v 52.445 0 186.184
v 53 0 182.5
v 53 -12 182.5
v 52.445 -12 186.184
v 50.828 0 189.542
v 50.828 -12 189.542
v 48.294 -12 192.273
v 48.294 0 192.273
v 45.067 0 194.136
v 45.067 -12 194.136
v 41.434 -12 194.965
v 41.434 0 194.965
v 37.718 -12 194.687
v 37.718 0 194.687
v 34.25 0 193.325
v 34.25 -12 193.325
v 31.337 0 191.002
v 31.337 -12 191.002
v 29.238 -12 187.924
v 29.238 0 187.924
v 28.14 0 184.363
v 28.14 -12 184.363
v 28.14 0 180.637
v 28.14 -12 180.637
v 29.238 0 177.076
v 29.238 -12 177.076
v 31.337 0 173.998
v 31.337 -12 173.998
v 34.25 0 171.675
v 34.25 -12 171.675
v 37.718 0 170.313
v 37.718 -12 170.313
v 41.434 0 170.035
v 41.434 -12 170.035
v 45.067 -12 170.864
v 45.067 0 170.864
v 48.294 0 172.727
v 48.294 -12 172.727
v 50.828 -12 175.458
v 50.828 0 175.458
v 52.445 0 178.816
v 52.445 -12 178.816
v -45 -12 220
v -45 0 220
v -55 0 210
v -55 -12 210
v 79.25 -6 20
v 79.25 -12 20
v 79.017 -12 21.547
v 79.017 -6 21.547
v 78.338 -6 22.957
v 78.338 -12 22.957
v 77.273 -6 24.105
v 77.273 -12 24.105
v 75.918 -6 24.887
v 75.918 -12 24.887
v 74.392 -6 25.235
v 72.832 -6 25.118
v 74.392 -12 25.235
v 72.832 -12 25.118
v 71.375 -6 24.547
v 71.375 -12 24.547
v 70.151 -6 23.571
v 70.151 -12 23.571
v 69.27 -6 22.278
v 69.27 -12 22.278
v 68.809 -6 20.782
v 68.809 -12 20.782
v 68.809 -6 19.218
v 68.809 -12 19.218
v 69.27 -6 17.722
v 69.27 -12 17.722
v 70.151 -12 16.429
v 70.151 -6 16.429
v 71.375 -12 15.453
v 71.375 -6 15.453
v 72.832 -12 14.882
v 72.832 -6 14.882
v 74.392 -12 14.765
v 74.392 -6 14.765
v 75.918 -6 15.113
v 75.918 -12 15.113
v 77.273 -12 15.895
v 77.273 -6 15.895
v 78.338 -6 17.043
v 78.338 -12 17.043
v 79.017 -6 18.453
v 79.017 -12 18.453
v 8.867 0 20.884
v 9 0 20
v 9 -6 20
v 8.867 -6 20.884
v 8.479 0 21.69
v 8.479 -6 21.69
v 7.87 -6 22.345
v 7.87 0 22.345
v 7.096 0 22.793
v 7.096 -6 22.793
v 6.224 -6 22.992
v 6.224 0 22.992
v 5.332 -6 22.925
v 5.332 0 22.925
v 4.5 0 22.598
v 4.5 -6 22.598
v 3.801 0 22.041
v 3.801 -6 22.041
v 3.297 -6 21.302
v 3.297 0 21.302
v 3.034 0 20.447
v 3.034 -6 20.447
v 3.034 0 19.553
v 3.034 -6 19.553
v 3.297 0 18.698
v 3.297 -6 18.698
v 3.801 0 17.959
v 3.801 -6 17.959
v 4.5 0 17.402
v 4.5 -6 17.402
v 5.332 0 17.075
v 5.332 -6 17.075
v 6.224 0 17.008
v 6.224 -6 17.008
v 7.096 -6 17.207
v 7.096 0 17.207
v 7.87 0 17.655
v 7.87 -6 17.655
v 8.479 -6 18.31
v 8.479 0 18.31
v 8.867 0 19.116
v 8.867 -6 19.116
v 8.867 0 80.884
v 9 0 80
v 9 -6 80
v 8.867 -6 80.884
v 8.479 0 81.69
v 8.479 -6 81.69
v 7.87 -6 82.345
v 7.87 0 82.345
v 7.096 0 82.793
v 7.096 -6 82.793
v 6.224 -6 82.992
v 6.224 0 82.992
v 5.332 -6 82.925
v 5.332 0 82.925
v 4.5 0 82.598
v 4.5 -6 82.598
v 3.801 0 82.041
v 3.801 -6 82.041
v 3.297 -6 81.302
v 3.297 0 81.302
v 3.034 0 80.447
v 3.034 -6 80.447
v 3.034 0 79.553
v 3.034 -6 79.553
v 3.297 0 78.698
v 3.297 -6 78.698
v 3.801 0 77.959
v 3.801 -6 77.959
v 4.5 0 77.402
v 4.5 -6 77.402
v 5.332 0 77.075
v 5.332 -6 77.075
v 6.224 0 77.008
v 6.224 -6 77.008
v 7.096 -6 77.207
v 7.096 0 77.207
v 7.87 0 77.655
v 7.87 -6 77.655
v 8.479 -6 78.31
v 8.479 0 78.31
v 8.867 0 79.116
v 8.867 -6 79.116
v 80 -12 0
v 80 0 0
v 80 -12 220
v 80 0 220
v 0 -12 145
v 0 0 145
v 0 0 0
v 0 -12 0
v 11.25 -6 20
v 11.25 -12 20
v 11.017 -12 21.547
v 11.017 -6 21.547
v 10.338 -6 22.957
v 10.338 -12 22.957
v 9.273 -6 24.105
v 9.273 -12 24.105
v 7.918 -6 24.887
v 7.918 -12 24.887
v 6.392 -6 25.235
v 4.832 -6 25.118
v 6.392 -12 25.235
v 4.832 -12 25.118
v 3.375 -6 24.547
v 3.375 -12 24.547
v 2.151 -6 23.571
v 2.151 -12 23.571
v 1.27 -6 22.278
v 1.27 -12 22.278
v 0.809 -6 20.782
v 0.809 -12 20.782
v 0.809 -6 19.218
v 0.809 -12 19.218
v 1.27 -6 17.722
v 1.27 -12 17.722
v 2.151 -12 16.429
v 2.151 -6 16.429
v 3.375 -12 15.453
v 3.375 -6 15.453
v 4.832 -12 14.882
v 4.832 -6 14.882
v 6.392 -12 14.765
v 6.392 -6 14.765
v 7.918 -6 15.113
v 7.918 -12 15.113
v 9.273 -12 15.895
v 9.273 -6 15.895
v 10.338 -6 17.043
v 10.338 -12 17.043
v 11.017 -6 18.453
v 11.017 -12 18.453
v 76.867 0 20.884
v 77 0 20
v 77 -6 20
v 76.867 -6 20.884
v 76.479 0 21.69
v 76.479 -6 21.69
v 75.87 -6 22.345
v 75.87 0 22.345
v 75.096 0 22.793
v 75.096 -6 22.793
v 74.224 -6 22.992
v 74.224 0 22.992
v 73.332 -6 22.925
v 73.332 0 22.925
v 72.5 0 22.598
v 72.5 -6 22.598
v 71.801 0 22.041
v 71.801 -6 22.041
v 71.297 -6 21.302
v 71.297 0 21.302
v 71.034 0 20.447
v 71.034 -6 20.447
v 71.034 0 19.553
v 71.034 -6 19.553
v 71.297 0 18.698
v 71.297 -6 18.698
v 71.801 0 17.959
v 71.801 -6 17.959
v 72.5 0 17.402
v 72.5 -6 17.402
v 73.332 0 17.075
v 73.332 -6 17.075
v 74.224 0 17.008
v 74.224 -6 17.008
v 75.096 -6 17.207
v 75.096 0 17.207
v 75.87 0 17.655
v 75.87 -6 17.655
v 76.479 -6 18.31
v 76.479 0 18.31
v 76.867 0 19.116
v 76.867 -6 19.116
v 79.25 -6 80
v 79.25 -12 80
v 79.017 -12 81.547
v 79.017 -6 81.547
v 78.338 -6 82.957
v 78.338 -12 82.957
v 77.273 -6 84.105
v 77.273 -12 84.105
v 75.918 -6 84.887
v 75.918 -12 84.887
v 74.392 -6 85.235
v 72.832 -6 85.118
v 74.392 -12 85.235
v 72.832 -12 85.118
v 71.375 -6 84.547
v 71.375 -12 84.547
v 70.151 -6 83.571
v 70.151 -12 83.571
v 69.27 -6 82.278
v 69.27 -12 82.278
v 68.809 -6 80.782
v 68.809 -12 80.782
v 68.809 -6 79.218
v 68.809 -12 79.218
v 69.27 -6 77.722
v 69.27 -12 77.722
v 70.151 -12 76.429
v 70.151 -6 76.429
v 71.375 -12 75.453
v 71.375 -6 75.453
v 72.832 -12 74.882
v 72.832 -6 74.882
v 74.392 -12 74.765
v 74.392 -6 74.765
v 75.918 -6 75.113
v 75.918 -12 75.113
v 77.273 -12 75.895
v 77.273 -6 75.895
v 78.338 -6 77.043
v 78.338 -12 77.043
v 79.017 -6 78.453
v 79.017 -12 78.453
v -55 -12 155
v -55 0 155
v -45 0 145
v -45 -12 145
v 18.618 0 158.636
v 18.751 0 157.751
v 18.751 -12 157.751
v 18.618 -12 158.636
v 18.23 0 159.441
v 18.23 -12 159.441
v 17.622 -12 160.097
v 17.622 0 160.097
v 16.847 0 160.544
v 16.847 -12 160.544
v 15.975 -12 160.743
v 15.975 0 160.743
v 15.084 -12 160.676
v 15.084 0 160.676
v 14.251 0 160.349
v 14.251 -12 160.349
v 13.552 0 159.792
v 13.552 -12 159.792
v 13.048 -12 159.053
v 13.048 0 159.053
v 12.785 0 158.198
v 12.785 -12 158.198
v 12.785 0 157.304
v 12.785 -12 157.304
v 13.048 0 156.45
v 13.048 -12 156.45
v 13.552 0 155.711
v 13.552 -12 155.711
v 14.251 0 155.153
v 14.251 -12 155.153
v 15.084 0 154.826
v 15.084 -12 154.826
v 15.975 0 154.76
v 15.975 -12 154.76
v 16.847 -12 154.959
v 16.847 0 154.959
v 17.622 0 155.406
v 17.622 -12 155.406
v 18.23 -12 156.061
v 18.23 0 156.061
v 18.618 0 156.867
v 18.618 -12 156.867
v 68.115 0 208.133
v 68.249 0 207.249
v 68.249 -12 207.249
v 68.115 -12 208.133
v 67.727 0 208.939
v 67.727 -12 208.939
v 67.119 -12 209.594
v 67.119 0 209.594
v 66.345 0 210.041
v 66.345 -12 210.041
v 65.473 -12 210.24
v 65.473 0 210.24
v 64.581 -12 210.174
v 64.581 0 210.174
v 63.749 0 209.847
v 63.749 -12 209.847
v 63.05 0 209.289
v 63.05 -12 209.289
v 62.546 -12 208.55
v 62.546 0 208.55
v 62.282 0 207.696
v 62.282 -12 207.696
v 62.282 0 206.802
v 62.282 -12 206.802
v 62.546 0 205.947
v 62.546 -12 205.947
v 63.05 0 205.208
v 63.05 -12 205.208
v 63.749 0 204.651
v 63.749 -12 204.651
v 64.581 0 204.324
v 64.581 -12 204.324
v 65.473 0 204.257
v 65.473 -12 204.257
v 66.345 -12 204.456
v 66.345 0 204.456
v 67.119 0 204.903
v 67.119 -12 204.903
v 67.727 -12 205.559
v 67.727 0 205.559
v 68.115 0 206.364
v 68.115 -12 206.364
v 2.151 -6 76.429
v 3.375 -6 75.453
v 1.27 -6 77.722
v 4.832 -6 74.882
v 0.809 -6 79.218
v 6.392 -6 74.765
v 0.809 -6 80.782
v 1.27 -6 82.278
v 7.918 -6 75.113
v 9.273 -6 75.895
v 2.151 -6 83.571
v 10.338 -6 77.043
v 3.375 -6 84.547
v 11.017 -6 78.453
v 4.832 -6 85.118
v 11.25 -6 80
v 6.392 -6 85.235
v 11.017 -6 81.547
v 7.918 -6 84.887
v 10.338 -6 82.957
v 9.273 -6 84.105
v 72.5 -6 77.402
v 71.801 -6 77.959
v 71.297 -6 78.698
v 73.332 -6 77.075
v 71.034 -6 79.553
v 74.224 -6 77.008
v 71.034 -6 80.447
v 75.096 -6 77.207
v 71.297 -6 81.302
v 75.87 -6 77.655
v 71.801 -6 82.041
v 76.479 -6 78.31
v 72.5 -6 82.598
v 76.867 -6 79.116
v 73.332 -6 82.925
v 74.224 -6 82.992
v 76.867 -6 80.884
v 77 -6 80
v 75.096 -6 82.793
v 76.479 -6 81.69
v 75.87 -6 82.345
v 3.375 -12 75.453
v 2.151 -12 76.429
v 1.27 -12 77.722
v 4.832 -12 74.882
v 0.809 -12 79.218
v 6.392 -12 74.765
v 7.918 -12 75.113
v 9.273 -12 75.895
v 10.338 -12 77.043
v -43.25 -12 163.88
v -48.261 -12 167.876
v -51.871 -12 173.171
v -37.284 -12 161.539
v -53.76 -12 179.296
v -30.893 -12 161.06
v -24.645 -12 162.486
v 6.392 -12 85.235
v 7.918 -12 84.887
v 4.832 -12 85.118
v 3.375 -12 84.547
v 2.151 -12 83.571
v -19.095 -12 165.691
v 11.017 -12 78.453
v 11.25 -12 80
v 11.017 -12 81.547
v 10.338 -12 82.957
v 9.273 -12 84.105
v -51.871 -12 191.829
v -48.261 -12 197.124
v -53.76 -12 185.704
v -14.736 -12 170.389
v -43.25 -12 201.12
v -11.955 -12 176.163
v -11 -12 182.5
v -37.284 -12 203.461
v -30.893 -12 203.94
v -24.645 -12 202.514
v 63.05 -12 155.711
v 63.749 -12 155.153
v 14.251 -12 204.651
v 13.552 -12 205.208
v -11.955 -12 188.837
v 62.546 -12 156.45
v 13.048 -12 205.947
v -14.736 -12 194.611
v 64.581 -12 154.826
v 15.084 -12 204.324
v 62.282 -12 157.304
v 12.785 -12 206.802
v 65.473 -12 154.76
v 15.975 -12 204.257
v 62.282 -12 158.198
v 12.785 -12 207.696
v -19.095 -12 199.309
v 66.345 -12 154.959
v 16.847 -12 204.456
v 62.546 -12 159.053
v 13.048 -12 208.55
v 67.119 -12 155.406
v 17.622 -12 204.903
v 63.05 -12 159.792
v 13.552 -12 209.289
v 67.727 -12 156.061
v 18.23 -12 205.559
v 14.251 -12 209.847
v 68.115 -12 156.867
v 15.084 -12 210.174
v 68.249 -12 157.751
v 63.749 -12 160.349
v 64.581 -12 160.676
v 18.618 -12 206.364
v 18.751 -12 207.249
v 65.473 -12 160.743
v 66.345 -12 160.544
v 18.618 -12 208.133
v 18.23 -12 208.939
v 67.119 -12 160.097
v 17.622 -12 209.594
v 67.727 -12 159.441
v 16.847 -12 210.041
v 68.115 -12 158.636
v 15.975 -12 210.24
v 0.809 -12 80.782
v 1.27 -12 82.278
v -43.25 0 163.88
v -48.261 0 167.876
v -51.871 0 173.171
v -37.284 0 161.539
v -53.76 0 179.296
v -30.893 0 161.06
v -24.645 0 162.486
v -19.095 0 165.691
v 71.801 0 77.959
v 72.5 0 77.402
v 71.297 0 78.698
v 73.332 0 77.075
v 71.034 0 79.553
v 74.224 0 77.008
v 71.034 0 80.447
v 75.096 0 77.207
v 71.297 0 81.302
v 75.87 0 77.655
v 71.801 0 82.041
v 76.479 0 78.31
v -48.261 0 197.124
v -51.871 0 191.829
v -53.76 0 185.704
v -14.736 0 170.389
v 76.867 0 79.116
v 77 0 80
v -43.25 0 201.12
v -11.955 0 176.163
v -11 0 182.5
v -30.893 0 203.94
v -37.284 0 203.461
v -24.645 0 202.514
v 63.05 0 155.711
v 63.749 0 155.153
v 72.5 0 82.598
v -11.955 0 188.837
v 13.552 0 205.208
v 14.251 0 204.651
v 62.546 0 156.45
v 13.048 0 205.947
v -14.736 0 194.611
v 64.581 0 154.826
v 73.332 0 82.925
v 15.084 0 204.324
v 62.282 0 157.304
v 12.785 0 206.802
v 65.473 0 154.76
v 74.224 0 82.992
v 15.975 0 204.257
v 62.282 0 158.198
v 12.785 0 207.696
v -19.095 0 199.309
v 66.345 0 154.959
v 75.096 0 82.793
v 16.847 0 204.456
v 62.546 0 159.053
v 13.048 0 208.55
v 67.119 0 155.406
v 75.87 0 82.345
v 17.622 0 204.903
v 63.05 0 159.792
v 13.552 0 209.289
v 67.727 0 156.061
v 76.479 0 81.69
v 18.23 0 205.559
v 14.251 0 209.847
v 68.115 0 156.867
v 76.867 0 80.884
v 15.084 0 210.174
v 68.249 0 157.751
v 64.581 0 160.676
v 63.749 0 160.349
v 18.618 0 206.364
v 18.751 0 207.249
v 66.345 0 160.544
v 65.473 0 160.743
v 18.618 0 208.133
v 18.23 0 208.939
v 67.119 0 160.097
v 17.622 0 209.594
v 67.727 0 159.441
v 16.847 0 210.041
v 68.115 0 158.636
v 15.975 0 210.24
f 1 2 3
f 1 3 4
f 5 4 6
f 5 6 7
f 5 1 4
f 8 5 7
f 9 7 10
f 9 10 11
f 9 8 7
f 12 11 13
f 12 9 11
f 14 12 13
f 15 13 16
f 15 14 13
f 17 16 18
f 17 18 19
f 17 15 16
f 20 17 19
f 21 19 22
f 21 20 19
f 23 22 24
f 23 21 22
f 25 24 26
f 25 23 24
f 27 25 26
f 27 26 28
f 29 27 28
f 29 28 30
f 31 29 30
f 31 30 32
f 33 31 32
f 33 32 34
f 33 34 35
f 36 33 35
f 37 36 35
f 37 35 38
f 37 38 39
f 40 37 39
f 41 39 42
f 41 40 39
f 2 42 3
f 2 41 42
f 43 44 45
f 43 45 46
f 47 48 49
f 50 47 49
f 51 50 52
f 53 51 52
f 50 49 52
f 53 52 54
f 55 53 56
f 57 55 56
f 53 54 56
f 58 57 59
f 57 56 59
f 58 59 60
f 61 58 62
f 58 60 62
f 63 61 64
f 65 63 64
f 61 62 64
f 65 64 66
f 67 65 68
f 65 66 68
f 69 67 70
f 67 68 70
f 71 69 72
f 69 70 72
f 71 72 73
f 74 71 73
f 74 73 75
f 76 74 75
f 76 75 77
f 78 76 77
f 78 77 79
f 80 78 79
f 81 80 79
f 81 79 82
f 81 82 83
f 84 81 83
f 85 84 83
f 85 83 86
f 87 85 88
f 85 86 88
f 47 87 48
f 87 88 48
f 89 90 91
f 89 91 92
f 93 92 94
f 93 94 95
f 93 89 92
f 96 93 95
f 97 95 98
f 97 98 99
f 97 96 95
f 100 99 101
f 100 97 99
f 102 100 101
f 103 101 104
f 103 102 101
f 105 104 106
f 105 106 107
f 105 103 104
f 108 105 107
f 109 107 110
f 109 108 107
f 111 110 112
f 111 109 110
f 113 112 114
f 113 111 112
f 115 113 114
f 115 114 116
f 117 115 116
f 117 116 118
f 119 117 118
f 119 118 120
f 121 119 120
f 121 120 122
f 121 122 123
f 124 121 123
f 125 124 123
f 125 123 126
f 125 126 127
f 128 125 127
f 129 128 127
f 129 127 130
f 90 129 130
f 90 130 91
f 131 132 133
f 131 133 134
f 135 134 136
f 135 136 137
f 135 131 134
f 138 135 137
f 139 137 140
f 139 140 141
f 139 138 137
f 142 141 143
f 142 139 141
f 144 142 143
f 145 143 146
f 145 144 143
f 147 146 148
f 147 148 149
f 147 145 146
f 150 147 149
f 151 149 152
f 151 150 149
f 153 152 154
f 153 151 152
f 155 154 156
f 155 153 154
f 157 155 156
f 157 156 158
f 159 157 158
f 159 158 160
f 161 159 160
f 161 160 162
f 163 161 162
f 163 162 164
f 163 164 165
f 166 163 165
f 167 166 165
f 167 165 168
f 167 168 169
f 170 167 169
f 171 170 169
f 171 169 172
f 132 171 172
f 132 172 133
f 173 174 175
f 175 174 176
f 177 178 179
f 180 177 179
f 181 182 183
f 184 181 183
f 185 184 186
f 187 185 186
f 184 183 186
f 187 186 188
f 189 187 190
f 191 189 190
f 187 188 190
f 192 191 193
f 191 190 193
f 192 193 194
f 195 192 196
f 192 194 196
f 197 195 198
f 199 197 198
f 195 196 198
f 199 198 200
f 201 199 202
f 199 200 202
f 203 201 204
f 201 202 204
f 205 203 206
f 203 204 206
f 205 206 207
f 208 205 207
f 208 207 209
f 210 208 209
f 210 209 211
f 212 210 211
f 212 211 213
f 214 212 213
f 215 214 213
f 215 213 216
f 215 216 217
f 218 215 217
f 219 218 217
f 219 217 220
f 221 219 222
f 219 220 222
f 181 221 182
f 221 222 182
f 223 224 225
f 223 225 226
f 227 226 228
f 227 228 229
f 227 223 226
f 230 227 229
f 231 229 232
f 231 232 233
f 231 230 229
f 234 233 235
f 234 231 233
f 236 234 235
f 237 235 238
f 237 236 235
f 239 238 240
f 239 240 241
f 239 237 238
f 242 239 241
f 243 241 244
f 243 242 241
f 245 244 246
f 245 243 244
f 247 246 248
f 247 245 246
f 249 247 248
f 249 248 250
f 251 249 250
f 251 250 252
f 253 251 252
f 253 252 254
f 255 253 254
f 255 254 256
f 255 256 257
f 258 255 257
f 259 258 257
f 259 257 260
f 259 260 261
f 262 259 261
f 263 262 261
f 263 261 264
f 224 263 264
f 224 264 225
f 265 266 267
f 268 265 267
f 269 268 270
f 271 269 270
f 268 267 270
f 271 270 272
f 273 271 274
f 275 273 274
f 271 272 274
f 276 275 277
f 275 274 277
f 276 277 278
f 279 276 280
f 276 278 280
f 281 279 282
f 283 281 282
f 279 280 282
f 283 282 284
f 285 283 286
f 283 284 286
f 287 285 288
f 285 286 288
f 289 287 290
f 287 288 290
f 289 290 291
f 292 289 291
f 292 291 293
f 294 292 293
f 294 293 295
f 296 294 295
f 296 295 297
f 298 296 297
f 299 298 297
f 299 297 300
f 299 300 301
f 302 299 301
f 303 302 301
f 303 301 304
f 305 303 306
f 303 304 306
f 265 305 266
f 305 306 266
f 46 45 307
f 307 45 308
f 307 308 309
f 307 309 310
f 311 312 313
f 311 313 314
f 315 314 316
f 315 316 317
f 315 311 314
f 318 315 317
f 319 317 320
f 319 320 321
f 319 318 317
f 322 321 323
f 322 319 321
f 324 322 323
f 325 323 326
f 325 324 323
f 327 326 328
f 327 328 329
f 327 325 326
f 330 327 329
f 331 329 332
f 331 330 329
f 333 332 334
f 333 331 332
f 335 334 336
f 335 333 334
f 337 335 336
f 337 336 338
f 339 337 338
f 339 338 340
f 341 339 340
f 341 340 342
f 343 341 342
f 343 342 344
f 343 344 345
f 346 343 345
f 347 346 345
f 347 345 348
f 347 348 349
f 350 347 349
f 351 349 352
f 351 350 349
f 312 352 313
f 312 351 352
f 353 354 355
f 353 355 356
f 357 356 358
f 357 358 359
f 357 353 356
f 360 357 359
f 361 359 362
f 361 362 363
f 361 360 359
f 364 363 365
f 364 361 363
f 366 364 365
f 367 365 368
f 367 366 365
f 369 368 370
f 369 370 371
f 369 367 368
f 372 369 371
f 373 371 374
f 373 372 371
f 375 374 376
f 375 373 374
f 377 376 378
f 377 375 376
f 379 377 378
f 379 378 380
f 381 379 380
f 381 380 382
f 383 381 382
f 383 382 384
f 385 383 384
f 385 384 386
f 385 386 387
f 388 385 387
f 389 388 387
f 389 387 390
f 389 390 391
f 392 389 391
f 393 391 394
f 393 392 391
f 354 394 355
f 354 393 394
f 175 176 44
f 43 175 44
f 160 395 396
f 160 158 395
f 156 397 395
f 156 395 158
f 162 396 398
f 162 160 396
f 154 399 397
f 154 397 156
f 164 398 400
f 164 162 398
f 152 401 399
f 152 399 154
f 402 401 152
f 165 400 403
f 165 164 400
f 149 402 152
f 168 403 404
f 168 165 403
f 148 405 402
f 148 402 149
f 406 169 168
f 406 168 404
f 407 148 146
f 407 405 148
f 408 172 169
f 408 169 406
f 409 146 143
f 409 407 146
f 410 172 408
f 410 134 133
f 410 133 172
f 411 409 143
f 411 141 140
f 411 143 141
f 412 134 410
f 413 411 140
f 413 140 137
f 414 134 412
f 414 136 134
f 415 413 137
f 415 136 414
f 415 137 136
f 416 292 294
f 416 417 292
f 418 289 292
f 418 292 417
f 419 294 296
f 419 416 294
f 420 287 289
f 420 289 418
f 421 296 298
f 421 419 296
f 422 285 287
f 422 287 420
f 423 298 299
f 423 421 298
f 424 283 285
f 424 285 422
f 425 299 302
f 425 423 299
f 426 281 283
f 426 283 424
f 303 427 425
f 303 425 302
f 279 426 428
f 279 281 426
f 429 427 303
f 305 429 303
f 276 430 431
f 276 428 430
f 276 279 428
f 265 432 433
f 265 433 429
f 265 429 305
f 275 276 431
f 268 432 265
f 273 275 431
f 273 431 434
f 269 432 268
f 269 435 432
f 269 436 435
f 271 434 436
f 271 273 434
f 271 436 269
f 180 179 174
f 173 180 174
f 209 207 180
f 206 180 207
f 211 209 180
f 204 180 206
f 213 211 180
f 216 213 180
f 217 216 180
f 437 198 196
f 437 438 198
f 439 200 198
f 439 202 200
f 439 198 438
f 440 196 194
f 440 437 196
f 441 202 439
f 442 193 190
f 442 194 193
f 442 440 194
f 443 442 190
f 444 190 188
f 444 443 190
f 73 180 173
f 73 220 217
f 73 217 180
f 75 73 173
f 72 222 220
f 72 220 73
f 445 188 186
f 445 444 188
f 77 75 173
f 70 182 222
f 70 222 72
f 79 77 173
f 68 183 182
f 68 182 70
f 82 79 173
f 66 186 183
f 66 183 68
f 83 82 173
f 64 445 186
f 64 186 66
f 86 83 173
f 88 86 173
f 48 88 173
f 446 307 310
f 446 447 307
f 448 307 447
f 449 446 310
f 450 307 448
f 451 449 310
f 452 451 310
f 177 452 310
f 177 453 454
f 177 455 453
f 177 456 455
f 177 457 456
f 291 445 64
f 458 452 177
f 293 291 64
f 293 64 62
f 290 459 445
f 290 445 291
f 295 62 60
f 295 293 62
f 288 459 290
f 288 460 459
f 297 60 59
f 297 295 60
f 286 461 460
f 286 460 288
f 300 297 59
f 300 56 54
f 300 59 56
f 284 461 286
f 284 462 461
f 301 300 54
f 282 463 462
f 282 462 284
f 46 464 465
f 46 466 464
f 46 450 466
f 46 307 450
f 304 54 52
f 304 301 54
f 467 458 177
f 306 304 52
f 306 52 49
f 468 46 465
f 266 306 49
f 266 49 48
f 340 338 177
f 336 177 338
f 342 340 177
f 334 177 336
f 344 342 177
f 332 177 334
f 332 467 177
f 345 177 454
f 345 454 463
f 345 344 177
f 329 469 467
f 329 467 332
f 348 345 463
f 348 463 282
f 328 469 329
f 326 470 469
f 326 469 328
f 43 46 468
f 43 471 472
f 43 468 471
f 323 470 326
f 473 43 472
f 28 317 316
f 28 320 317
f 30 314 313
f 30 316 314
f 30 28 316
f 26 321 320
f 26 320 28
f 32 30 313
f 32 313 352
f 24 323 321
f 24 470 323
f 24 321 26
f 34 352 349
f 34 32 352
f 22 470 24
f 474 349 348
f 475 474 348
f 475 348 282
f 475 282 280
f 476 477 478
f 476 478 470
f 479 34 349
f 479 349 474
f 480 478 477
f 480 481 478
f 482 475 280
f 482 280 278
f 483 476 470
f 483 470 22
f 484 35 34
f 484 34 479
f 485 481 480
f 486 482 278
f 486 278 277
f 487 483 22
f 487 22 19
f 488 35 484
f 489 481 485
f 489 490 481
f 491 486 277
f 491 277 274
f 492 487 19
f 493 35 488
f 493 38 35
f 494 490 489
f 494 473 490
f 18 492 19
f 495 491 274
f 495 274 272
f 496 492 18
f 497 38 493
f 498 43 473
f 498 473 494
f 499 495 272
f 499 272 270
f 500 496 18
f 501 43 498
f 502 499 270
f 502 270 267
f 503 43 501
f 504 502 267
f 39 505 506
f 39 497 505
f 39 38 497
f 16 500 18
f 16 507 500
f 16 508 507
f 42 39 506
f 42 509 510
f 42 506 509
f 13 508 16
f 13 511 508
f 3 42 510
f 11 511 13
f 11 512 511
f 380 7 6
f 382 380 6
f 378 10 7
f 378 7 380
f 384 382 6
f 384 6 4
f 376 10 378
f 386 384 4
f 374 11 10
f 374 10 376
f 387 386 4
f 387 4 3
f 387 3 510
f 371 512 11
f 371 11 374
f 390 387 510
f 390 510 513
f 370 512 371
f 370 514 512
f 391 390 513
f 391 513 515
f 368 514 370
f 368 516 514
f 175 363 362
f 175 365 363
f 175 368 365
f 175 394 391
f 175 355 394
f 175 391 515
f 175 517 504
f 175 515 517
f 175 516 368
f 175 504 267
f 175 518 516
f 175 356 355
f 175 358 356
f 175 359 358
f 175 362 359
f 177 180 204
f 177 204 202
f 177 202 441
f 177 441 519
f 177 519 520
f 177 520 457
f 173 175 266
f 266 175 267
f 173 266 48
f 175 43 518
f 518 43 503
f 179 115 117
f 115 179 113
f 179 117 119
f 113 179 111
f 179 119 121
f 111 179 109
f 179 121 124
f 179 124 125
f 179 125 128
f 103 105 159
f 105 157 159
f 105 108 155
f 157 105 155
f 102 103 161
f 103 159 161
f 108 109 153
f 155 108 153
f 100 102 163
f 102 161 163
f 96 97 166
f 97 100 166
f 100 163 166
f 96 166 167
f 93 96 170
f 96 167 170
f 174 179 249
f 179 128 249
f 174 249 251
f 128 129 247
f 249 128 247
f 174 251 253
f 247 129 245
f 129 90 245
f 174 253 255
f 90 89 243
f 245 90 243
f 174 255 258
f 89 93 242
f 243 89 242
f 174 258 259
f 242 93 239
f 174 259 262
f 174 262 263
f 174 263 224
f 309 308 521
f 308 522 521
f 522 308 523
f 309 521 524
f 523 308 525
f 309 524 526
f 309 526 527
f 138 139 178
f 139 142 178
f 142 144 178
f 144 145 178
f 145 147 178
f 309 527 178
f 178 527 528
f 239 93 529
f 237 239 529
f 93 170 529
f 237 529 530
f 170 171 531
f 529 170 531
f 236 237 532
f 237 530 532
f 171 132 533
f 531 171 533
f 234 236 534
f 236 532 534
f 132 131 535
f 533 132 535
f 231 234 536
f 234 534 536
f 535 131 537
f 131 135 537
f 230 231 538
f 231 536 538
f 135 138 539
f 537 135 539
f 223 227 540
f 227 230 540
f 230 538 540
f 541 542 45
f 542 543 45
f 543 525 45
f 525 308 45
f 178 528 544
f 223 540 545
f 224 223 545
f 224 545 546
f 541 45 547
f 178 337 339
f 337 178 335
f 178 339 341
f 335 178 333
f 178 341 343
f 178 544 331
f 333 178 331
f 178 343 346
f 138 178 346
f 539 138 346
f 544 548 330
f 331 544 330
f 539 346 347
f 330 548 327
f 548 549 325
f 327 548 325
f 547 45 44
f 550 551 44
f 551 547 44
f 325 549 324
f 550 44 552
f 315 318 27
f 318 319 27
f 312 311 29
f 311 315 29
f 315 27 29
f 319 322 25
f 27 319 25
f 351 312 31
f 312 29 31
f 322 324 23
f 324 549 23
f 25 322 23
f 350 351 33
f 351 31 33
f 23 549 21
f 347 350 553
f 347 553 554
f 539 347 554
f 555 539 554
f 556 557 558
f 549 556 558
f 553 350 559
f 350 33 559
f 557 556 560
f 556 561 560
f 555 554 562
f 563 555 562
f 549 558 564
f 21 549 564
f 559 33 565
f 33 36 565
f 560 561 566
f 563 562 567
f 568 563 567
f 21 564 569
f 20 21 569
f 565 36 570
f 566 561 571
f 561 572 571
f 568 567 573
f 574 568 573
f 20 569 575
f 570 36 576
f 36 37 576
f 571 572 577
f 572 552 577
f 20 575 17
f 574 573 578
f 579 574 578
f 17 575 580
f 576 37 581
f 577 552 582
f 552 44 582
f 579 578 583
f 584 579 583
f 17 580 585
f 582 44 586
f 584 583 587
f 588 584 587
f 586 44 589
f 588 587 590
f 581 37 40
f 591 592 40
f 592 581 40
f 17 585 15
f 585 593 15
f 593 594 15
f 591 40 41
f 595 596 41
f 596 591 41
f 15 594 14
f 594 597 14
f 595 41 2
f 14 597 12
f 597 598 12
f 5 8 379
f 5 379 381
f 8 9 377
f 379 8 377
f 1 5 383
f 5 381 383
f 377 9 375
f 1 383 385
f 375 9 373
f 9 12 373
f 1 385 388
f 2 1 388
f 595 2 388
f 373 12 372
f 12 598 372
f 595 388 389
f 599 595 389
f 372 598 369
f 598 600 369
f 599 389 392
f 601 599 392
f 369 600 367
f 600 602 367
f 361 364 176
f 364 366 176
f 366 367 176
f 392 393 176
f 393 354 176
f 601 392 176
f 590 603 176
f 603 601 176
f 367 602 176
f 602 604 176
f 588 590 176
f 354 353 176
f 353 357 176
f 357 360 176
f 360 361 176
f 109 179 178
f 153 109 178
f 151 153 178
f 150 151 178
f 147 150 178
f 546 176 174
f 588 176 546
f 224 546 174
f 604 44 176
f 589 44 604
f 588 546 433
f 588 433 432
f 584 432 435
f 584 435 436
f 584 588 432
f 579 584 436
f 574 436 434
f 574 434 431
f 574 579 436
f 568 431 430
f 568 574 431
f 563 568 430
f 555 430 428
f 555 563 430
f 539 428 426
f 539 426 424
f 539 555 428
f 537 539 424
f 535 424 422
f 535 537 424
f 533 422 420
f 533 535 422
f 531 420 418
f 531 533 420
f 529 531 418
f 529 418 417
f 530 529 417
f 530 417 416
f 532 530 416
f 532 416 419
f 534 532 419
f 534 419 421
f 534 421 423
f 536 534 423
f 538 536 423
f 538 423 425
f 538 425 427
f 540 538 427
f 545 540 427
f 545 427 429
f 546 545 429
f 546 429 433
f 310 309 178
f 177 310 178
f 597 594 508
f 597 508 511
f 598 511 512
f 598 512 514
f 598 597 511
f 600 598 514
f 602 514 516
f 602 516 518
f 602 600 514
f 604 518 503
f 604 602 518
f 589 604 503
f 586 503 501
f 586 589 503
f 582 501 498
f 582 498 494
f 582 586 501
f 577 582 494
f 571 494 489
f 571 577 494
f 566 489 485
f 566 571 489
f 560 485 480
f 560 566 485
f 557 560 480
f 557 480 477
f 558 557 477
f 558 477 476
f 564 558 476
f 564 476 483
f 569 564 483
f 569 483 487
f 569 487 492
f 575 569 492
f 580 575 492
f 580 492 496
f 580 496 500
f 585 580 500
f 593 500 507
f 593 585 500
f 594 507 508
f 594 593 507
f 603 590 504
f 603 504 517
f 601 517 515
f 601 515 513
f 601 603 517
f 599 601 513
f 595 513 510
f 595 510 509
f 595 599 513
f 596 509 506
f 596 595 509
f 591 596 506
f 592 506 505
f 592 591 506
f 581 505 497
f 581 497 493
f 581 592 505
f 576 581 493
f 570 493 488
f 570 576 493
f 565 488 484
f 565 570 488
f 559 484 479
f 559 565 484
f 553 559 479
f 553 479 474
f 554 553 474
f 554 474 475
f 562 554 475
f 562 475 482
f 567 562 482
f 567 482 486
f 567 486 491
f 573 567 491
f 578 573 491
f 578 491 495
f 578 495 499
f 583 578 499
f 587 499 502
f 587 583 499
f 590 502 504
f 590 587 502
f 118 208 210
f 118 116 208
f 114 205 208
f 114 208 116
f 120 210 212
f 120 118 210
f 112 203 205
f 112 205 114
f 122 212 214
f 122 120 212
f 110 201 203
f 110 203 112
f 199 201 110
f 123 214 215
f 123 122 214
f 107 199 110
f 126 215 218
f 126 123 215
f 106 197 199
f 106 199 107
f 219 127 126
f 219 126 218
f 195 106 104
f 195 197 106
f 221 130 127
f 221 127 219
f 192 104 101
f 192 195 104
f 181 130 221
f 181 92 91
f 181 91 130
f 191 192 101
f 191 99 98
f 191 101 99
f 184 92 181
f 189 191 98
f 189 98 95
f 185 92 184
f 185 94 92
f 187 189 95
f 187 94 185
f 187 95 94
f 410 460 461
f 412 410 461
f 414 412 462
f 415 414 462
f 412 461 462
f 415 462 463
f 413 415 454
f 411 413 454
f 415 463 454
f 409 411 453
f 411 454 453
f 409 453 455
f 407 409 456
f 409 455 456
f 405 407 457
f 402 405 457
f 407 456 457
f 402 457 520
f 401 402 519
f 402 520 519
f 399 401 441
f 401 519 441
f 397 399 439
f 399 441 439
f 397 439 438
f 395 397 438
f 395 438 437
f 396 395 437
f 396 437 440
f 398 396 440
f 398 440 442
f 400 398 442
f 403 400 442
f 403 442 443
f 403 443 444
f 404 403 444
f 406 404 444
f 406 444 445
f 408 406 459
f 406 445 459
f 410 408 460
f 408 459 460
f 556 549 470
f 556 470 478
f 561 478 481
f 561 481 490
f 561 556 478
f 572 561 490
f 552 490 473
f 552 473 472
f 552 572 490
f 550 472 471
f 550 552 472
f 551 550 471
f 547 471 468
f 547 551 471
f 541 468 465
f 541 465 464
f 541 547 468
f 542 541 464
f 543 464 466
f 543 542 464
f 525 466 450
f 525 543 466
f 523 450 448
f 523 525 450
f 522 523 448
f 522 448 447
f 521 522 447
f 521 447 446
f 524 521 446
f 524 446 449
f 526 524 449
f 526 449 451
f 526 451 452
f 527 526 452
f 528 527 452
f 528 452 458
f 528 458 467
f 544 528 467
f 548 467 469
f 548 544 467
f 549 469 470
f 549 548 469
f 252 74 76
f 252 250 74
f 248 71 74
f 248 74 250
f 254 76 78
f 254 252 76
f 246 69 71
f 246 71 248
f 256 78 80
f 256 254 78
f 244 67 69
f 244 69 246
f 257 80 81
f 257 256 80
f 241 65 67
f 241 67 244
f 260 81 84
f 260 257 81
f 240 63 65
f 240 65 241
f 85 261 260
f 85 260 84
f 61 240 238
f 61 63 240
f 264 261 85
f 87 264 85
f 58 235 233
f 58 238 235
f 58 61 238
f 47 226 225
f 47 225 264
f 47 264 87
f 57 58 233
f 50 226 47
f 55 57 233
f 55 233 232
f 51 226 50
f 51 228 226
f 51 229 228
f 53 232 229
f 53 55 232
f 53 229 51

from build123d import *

# Parameters (mm, degrees)
F0_R     = 3
F0_R_2   = 21.5
F0_R_3   = 12.5
F1_DEPTH = 12
F2_SIZE  = 10
F3_R     = 5.25
F3_R_2   = 3
F4_DEPTH = 6


with BuildPart() as f1:
    # F0 (on Front) → F1 (new body)
    with BuildSketch(Plane.XZ):
        Polygon((0, 145), (0, 0), (80, 0), (80, 220), (-55, 220), (-55, 145), align=None)
        with Locations((6, 20)):
            Circle(F0_R, mode=Mode.SUBTRACT)
        with Locations((6, 80)):
            Circle(F0_R, mode=Mode.SUBTRACT)
        with Locations((74, 20)):
            Circle(F0_R, mode=Mode.SUBTRACT)
        with Locations((74, 80)):
            Circle(F0_R, mode=Mode.SUBTRACT)
        with Locations((-32.5, 182.5)):
            Circle(F0_R_2, mode=Mode.SUBTRACT)
        with Locations((15.751263, 157.751263)):
            Circle(F0_R, mode=Mode.SUBTRACT)
        with Locations((65.248737, 157.751263)):
            Circle(F0_R, mode=Mode.SUBTRACT)
        with Locations((40.5, 182.5)):
            Circle(F0_R_3, mode=Mode.SUBTRACT)
        with Locations((15.751263, 207.248737)):
            Circle(F0_R, mode=Mode.SUBTRACT)
        with Locations((65.248737, 207.248737)):
            Circle(F0_R, mode=Mode.SUBTRACT)
    extrude(amount=F1_DEPTH)

    # F2
    f2_edges = [f1.edges().sort_by_distance(p)[0] for p in [
        (-55, -6, 220),
        (-55, -6, 145),
    ]]
    chamfer(f2_edges, length=F2_SIZE)

    # F3 (on face) → F4 (cut)
    with BuildSketch(Plane.XZ.offset(12)):
        with Locations((6, 80)):
            Circle(F3_R)
        with Locations((6, 80)):
            Circle(F3_R_2, mode=Mode.SUBTRACT)
        with Locations((74, 80)):
            Circle(F3_R)
        with Locations((74, 80)):
            Circle(F3_R_2, mode=Mode.SUBTRACT)
        with Locations((74, 20)):
            Circle(F3_R)
        with Locations((74, 20)):
            Circle(F3_R_2, mode=Mode.SUBTRACT)
        with Locations((6, 20)):
            Circle(F3_R)
        with Locations((6, 20)):
            Circle(F3_R_2, mode=Mode.SUBTRACT)
    extrude(amount=-F4_DEPTH, mode=Mode.SUBTRACT)


solid = f1.part
